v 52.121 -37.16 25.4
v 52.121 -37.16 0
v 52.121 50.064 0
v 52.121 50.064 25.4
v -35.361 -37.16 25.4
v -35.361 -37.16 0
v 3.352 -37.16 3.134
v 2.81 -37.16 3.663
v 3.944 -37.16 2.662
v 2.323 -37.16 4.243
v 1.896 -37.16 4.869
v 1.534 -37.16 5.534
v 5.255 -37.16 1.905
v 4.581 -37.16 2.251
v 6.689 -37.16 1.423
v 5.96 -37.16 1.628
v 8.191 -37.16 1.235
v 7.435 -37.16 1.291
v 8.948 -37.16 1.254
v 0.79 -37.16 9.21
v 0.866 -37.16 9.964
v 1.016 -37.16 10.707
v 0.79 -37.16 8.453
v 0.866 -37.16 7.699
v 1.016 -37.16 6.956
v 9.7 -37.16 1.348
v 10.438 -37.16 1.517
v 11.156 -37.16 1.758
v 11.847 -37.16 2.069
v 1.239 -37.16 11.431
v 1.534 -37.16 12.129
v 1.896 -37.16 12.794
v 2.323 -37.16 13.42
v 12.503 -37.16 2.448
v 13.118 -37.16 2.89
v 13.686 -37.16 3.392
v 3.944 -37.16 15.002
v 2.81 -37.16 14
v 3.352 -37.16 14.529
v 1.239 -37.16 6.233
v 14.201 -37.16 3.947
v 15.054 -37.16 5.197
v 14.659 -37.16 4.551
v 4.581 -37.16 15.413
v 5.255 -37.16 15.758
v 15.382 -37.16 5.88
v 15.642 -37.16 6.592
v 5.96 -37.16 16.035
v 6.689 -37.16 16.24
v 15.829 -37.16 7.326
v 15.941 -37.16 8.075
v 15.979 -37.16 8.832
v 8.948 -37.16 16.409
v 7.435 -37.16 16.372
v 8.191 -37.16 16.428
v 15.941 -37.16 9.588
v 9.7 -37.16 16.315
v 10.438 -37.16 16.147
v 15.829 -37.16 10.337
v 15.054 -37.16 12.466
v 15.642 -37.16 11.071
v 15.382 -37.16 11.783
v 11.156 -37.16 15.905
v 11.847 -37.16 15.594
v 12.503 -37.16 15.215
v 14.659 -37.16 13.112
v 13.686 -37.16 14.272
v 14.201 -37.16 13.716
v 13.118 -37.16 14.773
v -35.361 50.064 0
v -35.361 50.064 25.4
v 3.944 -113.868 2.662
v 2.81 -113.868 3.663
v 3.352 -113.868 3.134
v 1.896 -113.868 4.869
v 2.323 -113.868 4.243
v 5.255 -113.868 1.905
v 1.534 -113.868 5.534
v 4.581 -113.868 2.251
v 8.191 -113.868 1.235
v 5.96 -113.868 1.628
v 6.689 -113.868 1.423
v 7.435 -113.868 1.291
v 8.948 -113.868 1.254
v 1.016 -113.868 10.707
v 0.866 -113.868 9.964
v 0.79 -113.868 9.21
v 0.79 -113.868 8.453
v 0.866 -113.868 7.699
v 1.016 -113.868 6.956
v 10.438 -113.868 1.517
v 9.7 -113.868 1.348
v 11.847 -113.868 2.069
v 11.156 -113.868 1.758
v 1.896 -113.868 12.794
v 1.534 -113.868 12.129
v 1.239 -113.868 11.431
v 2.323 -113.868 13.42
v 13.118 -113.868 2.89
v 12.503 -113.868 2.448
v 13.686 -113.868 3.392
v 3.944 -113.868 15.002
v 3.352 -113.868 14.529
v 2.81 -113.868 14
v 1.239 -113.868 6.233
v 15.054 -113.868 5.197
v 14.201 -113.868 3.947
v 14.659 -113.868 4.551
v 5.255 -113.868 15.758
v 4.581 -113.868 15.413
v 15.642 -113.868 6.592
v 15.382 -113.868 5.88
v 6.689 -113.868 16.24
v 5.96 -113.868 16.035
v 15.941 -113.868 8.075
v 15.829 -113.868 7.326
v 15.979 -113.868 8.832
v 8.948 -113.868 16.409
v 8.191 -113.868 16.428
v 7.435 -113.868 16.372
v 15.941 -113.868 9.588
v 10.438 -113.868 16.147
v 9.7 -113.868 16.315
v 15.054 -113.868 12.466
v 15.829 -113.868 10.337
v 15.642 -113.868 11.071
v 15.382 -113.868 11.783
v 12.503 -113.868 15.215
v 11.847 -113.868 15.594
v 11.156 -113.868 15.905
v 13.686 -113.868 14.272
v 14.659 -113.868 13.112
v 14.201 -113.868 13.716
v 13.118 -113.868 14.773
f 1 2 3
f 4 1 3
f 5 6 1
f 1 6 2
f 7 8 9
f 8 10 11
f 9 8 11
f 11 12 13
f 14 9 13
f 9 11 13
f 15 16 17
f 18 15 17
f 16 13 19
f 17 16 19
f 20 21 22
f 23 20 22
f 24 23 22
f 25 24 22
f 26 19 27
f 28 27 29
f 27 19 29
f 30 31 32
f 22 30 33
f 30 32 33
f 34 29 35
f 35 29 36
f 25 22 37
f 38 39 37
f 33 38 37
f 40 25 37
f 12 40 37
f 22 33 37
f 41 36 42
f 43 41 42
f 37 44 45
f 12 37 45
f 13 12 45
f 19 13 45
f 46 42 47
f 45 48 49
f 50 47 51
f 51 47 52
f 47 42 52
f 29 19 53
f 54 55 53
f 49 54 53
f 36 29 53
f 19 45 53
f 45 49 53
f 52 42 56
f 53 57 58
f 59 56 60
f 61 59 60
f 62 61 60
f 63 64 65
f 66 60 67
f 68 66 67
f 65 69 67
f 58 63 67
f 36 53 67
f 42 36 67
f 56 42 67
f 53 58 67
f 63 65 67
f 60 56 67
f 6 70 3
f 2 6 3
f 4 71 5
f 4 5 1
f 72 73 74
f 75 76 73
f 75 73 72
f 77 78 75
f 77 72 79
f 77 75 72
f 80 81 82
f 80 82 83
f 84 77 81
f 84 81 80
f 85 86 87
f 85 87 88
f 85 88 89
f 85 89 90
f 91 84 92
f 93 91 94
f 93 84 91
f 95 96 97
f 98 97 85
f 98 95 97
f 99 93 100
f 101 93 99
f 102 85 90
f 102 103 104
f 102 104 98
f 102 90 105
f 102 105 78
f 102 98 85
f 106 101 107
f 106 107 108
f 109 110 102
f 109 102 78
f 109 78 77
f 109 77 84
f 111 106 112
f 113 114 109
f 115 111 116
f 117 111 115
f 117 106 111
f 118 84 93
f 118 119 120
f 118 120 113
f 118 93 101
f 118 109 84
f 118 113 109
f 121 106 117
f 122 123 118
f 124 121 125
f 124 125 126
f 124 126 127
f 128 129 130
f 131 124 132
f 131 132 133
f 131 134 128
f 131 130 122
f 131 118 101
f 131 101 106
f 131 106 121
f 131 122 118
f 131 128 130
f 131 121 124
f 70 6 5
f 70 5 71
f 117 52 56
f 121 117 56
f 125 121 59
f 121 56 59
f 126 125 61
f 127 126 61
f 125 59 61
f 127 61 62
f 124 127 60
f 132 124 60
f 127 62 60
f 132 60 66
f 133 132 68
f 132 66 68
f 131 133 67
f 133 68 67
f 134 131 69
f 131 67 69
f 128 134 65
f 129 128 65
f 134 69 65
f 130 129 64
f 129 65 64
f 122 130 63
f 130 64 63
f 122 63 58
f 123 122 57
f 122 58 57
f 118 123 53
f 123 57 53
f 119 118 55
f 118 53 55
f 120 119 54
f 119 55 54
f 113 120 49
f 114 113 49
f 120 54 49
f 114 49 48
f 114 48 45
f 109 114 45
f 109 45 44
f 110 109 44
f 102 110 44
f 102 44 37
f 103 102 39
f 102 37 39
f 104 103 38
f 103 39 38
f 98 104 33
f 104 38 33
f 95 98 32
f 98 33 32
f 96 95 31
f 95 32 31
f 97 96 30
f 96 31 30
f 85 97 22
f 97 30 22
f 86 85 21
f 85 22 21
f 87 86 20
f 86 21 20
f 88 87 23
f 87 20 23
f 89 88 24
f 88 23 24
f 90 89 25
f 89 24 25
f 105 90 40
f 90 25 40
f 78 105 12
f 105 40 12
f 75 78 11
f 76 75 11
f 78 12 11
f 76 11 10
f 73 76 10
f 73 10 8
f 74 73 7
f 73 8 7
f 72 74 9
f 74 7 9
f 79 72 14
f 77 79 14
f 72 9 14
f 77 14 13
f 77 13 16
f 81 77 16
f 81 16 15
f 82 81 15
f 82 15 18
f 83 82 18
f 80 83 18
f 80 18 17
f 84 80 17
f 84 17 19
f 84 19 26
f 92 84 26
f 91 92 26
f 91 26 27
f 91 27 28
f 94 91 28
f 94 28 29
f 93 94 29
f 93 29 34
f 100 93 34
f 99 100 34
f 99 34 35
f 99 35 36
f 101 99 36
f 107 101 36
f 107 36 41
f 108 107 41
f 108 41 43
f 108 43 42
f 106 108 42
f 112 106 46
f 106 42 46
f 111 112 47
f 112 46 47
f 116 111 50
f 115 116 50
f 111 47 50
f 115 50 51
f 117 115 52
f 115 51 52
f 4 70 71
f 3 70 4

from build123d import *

# Parameters (mm, degrees)
F0_W     = 87.481856
F0_H     = 87.224066
F1_DEPTH = 25.4
F2_R     = 7.599099
F3_DEPTH = 76.708


with BuildPart() as f1:
    # F0 (on Top) → F1 (new body)
    with BuildSketch(Plane.XY):
        with Locations((8.380093, 6.452296)):
            Rectangle(F0_W, F0_H)
    extrude(amount=F1_DEPTH)


with BuildPart() as f3:
    # F2 (on face) → F3 (new body)
    with BuildSketch(Plane.XZ.offset(37.159737)):
        with Locations((8.380093, 8.8316)):
            Circle(F2_R)
    extrude(amount=F3_DEPTH)


solid = Compound([f1.part, f3.part])
